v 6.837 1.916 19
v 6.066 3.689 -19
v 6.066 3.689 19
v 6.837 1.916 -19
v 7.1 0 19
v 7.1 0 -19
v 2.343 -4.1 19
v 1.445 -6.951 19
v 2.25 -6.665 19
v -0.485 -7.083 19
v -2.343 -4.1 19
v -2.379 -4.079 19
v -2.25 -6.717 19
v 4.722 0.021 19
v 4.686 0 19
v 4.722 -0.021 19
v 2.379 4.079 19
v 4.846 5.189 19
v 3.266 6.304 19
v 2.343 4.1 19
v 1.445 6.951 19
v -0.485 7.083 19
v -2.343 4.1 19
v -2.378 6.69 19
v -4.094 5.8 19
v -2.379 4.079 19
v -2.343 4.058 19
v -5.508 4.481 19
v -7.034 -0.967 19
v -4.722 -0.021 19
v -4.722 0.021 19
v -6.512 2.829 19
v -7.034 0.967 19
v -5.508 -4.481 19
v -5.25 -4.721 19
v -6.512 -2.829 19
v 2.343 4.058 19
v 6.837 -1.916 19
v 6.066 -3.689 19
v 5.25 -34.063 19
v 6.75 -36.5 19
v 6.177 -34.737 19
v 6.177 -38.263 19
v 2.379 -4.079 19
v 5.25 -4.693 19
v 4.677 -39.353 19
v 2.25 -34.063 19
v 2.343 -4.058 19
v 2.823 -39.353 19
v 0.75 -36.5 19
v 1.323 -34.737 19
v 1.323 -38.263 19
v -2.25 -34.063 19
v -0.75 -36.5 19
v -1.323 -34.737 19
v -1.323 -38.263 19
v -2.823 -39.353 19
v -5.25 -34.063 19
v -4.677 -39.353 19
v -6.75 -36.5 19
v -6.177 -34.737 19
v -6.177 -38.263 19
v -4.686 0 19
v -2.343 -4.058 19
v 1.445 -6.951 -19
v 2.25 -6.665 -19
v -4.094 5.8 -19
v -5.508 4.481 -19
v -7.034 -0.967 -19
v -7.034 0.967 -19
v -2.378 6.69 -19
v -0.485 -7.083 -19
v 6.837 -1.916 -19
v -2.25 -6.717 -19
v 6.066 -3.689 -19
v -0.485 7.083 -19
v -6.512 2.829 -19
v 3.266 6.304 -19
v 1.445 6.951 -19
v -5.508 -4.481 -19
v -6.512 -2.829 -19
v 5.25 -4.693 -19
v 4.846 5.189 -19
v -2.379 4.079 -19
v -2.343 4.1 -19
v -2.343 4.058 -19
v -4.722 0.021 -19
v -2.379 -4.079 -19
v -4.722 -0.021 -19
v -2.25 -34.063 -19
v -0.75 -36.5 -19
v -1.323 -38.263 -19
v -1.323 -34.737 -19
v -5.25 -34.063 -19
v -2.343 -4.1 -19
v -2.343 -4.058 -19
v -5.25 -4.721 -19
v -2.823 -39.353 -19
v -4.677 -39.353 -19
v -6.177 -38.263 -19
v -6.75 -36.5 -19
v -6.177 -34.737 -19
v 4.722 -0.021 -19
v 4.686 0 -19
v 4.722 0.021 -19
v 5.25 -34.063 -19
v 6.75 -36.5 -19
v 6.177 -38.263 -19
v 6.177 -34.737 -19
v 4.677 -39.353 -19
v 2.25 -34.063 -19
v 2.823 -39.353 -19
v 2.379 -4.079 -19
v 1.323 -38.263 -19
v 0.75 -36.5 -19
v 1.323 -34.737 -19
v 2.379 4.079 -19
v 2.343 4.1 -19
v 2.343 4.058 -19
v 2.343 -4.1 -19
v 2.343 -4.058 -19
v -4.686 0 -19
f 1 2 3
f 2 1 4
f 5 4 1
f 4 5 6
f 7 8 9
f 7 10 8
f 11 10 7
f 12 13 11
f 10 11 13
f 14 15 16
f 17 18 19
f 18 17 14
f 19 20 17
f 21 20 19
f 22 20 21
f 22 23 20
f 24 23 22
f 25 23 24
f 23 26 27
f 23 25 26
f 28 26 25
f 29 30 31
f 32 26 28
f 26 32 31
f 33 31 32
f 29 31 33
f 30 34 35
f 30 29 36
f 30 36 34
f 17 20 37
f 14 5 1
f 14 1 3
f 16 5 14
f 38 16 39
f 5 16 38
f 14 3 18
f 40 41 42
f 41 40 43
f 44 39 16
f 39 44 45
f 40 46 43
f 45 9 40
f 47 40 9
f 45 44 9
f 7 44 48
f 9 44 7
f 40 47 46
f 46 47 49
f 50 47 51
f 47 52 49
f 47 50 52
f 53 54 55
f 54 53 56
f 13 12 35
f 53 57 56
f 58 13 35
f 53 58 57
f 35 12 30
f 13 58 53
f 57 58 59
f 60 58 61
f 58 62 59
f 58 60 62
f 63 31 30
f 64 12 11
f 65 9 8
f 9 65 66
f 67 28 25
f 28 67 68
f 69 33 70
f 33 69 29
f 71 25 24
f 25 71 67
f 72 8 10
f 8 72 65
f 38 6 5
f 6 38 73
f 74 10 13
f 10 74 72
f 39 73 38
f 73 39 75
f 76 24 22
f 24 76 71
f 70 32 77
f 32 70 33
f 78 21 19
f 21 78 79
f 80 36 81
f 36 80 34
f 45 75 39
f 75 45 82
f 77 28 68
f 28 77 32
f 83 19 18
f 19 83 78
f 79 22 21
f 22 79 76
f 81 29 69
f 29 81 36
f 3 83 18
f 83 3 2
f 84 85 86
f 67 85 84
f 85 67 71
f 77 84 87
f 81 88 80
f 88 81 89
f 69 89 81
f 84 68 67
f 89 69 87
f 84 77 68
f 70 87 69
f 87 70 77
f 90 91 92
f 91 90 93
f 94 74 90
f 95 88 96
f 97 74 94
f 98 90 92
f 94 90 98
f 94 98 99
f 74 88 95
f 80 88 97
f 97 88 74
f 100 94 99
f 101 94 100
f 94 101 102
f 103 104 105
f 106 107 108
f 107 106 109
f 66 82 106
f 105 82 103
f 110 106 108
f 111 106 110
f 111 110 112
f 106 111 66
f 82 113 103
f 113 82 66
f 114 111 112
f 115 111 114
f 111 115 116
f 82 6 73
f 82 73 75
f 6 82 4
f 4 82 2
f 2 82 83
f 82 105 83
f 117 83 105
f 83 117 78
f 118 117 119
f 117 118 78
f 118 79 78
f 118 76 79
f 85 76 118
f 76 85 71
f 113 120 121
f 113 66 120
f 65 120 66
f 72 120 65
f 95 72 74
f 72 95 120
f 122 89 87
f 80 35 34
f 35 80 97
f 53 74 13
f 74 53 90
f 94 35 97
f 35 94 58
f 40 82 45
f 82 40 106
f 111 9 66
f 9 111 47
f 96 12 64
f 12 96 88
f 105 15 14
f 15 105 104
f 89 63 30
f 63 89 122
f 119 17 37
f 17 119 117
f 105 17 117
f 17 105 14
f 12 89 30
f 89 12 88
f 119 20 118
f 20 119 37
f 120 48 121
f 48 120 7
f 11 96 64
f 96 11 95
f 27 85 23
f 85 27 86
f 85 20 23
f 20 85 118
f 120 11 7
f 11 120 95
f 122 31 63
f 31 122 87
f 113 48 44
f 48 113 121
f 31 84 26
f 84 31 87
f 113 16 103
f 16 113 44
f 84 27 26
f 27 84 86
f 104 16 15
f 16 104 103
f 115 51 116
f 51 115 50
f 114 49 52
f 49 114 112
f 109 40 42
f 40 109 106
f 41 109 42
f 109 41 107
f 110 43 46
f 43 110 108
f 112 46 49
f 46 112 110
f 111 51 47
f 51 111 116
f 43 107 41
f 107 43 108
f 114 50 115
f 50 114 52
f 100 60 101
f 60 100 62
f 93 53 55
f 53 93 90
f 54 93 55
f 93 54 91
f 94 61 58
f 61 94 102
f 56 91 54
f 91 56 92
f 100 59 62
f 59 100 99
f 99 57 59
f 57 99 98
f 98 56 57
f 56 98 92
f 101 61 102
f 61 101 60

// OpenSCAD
// [FL_INDEX: keywords="openscad, 3d_parametric, Field_Notes_Clip_for_Blackwing_602_Pencil, csg_solid" | COT="Parametric OpenSCAD design from 3DCodeverse"]
// Title: Field Notes Clip for Blackwing 602 Pencil

include <MCAD/shapes.scad>
pencilRadius = 4.1;
wallThickness = 3;
pencilWall = pencilRadius + wallThickness;
height = 38;
length = 35;

difference() {
union() {
cylinder(height,pencilWall,pencilWall,true);
translate([-3.75,-length/2,0])
cube([wallThickness,length,height],true);
translate([3.75,-length/2,0])
cube([wallThickness,length,height],true);
}

//#cylinder(height+2,pencilRadius,pencilRadius,true);
#hexagon(pencilRadius*2, height+2);



}
translate([3.75,-(length+(wallThickness*0.5)),0])
cylinder(height,wallThickness,wallThickness,true);
translate([-3.75,-(length+(wallThickness*0.5)),0])
cylinder(height,wallThickness,wallThickness,true);
